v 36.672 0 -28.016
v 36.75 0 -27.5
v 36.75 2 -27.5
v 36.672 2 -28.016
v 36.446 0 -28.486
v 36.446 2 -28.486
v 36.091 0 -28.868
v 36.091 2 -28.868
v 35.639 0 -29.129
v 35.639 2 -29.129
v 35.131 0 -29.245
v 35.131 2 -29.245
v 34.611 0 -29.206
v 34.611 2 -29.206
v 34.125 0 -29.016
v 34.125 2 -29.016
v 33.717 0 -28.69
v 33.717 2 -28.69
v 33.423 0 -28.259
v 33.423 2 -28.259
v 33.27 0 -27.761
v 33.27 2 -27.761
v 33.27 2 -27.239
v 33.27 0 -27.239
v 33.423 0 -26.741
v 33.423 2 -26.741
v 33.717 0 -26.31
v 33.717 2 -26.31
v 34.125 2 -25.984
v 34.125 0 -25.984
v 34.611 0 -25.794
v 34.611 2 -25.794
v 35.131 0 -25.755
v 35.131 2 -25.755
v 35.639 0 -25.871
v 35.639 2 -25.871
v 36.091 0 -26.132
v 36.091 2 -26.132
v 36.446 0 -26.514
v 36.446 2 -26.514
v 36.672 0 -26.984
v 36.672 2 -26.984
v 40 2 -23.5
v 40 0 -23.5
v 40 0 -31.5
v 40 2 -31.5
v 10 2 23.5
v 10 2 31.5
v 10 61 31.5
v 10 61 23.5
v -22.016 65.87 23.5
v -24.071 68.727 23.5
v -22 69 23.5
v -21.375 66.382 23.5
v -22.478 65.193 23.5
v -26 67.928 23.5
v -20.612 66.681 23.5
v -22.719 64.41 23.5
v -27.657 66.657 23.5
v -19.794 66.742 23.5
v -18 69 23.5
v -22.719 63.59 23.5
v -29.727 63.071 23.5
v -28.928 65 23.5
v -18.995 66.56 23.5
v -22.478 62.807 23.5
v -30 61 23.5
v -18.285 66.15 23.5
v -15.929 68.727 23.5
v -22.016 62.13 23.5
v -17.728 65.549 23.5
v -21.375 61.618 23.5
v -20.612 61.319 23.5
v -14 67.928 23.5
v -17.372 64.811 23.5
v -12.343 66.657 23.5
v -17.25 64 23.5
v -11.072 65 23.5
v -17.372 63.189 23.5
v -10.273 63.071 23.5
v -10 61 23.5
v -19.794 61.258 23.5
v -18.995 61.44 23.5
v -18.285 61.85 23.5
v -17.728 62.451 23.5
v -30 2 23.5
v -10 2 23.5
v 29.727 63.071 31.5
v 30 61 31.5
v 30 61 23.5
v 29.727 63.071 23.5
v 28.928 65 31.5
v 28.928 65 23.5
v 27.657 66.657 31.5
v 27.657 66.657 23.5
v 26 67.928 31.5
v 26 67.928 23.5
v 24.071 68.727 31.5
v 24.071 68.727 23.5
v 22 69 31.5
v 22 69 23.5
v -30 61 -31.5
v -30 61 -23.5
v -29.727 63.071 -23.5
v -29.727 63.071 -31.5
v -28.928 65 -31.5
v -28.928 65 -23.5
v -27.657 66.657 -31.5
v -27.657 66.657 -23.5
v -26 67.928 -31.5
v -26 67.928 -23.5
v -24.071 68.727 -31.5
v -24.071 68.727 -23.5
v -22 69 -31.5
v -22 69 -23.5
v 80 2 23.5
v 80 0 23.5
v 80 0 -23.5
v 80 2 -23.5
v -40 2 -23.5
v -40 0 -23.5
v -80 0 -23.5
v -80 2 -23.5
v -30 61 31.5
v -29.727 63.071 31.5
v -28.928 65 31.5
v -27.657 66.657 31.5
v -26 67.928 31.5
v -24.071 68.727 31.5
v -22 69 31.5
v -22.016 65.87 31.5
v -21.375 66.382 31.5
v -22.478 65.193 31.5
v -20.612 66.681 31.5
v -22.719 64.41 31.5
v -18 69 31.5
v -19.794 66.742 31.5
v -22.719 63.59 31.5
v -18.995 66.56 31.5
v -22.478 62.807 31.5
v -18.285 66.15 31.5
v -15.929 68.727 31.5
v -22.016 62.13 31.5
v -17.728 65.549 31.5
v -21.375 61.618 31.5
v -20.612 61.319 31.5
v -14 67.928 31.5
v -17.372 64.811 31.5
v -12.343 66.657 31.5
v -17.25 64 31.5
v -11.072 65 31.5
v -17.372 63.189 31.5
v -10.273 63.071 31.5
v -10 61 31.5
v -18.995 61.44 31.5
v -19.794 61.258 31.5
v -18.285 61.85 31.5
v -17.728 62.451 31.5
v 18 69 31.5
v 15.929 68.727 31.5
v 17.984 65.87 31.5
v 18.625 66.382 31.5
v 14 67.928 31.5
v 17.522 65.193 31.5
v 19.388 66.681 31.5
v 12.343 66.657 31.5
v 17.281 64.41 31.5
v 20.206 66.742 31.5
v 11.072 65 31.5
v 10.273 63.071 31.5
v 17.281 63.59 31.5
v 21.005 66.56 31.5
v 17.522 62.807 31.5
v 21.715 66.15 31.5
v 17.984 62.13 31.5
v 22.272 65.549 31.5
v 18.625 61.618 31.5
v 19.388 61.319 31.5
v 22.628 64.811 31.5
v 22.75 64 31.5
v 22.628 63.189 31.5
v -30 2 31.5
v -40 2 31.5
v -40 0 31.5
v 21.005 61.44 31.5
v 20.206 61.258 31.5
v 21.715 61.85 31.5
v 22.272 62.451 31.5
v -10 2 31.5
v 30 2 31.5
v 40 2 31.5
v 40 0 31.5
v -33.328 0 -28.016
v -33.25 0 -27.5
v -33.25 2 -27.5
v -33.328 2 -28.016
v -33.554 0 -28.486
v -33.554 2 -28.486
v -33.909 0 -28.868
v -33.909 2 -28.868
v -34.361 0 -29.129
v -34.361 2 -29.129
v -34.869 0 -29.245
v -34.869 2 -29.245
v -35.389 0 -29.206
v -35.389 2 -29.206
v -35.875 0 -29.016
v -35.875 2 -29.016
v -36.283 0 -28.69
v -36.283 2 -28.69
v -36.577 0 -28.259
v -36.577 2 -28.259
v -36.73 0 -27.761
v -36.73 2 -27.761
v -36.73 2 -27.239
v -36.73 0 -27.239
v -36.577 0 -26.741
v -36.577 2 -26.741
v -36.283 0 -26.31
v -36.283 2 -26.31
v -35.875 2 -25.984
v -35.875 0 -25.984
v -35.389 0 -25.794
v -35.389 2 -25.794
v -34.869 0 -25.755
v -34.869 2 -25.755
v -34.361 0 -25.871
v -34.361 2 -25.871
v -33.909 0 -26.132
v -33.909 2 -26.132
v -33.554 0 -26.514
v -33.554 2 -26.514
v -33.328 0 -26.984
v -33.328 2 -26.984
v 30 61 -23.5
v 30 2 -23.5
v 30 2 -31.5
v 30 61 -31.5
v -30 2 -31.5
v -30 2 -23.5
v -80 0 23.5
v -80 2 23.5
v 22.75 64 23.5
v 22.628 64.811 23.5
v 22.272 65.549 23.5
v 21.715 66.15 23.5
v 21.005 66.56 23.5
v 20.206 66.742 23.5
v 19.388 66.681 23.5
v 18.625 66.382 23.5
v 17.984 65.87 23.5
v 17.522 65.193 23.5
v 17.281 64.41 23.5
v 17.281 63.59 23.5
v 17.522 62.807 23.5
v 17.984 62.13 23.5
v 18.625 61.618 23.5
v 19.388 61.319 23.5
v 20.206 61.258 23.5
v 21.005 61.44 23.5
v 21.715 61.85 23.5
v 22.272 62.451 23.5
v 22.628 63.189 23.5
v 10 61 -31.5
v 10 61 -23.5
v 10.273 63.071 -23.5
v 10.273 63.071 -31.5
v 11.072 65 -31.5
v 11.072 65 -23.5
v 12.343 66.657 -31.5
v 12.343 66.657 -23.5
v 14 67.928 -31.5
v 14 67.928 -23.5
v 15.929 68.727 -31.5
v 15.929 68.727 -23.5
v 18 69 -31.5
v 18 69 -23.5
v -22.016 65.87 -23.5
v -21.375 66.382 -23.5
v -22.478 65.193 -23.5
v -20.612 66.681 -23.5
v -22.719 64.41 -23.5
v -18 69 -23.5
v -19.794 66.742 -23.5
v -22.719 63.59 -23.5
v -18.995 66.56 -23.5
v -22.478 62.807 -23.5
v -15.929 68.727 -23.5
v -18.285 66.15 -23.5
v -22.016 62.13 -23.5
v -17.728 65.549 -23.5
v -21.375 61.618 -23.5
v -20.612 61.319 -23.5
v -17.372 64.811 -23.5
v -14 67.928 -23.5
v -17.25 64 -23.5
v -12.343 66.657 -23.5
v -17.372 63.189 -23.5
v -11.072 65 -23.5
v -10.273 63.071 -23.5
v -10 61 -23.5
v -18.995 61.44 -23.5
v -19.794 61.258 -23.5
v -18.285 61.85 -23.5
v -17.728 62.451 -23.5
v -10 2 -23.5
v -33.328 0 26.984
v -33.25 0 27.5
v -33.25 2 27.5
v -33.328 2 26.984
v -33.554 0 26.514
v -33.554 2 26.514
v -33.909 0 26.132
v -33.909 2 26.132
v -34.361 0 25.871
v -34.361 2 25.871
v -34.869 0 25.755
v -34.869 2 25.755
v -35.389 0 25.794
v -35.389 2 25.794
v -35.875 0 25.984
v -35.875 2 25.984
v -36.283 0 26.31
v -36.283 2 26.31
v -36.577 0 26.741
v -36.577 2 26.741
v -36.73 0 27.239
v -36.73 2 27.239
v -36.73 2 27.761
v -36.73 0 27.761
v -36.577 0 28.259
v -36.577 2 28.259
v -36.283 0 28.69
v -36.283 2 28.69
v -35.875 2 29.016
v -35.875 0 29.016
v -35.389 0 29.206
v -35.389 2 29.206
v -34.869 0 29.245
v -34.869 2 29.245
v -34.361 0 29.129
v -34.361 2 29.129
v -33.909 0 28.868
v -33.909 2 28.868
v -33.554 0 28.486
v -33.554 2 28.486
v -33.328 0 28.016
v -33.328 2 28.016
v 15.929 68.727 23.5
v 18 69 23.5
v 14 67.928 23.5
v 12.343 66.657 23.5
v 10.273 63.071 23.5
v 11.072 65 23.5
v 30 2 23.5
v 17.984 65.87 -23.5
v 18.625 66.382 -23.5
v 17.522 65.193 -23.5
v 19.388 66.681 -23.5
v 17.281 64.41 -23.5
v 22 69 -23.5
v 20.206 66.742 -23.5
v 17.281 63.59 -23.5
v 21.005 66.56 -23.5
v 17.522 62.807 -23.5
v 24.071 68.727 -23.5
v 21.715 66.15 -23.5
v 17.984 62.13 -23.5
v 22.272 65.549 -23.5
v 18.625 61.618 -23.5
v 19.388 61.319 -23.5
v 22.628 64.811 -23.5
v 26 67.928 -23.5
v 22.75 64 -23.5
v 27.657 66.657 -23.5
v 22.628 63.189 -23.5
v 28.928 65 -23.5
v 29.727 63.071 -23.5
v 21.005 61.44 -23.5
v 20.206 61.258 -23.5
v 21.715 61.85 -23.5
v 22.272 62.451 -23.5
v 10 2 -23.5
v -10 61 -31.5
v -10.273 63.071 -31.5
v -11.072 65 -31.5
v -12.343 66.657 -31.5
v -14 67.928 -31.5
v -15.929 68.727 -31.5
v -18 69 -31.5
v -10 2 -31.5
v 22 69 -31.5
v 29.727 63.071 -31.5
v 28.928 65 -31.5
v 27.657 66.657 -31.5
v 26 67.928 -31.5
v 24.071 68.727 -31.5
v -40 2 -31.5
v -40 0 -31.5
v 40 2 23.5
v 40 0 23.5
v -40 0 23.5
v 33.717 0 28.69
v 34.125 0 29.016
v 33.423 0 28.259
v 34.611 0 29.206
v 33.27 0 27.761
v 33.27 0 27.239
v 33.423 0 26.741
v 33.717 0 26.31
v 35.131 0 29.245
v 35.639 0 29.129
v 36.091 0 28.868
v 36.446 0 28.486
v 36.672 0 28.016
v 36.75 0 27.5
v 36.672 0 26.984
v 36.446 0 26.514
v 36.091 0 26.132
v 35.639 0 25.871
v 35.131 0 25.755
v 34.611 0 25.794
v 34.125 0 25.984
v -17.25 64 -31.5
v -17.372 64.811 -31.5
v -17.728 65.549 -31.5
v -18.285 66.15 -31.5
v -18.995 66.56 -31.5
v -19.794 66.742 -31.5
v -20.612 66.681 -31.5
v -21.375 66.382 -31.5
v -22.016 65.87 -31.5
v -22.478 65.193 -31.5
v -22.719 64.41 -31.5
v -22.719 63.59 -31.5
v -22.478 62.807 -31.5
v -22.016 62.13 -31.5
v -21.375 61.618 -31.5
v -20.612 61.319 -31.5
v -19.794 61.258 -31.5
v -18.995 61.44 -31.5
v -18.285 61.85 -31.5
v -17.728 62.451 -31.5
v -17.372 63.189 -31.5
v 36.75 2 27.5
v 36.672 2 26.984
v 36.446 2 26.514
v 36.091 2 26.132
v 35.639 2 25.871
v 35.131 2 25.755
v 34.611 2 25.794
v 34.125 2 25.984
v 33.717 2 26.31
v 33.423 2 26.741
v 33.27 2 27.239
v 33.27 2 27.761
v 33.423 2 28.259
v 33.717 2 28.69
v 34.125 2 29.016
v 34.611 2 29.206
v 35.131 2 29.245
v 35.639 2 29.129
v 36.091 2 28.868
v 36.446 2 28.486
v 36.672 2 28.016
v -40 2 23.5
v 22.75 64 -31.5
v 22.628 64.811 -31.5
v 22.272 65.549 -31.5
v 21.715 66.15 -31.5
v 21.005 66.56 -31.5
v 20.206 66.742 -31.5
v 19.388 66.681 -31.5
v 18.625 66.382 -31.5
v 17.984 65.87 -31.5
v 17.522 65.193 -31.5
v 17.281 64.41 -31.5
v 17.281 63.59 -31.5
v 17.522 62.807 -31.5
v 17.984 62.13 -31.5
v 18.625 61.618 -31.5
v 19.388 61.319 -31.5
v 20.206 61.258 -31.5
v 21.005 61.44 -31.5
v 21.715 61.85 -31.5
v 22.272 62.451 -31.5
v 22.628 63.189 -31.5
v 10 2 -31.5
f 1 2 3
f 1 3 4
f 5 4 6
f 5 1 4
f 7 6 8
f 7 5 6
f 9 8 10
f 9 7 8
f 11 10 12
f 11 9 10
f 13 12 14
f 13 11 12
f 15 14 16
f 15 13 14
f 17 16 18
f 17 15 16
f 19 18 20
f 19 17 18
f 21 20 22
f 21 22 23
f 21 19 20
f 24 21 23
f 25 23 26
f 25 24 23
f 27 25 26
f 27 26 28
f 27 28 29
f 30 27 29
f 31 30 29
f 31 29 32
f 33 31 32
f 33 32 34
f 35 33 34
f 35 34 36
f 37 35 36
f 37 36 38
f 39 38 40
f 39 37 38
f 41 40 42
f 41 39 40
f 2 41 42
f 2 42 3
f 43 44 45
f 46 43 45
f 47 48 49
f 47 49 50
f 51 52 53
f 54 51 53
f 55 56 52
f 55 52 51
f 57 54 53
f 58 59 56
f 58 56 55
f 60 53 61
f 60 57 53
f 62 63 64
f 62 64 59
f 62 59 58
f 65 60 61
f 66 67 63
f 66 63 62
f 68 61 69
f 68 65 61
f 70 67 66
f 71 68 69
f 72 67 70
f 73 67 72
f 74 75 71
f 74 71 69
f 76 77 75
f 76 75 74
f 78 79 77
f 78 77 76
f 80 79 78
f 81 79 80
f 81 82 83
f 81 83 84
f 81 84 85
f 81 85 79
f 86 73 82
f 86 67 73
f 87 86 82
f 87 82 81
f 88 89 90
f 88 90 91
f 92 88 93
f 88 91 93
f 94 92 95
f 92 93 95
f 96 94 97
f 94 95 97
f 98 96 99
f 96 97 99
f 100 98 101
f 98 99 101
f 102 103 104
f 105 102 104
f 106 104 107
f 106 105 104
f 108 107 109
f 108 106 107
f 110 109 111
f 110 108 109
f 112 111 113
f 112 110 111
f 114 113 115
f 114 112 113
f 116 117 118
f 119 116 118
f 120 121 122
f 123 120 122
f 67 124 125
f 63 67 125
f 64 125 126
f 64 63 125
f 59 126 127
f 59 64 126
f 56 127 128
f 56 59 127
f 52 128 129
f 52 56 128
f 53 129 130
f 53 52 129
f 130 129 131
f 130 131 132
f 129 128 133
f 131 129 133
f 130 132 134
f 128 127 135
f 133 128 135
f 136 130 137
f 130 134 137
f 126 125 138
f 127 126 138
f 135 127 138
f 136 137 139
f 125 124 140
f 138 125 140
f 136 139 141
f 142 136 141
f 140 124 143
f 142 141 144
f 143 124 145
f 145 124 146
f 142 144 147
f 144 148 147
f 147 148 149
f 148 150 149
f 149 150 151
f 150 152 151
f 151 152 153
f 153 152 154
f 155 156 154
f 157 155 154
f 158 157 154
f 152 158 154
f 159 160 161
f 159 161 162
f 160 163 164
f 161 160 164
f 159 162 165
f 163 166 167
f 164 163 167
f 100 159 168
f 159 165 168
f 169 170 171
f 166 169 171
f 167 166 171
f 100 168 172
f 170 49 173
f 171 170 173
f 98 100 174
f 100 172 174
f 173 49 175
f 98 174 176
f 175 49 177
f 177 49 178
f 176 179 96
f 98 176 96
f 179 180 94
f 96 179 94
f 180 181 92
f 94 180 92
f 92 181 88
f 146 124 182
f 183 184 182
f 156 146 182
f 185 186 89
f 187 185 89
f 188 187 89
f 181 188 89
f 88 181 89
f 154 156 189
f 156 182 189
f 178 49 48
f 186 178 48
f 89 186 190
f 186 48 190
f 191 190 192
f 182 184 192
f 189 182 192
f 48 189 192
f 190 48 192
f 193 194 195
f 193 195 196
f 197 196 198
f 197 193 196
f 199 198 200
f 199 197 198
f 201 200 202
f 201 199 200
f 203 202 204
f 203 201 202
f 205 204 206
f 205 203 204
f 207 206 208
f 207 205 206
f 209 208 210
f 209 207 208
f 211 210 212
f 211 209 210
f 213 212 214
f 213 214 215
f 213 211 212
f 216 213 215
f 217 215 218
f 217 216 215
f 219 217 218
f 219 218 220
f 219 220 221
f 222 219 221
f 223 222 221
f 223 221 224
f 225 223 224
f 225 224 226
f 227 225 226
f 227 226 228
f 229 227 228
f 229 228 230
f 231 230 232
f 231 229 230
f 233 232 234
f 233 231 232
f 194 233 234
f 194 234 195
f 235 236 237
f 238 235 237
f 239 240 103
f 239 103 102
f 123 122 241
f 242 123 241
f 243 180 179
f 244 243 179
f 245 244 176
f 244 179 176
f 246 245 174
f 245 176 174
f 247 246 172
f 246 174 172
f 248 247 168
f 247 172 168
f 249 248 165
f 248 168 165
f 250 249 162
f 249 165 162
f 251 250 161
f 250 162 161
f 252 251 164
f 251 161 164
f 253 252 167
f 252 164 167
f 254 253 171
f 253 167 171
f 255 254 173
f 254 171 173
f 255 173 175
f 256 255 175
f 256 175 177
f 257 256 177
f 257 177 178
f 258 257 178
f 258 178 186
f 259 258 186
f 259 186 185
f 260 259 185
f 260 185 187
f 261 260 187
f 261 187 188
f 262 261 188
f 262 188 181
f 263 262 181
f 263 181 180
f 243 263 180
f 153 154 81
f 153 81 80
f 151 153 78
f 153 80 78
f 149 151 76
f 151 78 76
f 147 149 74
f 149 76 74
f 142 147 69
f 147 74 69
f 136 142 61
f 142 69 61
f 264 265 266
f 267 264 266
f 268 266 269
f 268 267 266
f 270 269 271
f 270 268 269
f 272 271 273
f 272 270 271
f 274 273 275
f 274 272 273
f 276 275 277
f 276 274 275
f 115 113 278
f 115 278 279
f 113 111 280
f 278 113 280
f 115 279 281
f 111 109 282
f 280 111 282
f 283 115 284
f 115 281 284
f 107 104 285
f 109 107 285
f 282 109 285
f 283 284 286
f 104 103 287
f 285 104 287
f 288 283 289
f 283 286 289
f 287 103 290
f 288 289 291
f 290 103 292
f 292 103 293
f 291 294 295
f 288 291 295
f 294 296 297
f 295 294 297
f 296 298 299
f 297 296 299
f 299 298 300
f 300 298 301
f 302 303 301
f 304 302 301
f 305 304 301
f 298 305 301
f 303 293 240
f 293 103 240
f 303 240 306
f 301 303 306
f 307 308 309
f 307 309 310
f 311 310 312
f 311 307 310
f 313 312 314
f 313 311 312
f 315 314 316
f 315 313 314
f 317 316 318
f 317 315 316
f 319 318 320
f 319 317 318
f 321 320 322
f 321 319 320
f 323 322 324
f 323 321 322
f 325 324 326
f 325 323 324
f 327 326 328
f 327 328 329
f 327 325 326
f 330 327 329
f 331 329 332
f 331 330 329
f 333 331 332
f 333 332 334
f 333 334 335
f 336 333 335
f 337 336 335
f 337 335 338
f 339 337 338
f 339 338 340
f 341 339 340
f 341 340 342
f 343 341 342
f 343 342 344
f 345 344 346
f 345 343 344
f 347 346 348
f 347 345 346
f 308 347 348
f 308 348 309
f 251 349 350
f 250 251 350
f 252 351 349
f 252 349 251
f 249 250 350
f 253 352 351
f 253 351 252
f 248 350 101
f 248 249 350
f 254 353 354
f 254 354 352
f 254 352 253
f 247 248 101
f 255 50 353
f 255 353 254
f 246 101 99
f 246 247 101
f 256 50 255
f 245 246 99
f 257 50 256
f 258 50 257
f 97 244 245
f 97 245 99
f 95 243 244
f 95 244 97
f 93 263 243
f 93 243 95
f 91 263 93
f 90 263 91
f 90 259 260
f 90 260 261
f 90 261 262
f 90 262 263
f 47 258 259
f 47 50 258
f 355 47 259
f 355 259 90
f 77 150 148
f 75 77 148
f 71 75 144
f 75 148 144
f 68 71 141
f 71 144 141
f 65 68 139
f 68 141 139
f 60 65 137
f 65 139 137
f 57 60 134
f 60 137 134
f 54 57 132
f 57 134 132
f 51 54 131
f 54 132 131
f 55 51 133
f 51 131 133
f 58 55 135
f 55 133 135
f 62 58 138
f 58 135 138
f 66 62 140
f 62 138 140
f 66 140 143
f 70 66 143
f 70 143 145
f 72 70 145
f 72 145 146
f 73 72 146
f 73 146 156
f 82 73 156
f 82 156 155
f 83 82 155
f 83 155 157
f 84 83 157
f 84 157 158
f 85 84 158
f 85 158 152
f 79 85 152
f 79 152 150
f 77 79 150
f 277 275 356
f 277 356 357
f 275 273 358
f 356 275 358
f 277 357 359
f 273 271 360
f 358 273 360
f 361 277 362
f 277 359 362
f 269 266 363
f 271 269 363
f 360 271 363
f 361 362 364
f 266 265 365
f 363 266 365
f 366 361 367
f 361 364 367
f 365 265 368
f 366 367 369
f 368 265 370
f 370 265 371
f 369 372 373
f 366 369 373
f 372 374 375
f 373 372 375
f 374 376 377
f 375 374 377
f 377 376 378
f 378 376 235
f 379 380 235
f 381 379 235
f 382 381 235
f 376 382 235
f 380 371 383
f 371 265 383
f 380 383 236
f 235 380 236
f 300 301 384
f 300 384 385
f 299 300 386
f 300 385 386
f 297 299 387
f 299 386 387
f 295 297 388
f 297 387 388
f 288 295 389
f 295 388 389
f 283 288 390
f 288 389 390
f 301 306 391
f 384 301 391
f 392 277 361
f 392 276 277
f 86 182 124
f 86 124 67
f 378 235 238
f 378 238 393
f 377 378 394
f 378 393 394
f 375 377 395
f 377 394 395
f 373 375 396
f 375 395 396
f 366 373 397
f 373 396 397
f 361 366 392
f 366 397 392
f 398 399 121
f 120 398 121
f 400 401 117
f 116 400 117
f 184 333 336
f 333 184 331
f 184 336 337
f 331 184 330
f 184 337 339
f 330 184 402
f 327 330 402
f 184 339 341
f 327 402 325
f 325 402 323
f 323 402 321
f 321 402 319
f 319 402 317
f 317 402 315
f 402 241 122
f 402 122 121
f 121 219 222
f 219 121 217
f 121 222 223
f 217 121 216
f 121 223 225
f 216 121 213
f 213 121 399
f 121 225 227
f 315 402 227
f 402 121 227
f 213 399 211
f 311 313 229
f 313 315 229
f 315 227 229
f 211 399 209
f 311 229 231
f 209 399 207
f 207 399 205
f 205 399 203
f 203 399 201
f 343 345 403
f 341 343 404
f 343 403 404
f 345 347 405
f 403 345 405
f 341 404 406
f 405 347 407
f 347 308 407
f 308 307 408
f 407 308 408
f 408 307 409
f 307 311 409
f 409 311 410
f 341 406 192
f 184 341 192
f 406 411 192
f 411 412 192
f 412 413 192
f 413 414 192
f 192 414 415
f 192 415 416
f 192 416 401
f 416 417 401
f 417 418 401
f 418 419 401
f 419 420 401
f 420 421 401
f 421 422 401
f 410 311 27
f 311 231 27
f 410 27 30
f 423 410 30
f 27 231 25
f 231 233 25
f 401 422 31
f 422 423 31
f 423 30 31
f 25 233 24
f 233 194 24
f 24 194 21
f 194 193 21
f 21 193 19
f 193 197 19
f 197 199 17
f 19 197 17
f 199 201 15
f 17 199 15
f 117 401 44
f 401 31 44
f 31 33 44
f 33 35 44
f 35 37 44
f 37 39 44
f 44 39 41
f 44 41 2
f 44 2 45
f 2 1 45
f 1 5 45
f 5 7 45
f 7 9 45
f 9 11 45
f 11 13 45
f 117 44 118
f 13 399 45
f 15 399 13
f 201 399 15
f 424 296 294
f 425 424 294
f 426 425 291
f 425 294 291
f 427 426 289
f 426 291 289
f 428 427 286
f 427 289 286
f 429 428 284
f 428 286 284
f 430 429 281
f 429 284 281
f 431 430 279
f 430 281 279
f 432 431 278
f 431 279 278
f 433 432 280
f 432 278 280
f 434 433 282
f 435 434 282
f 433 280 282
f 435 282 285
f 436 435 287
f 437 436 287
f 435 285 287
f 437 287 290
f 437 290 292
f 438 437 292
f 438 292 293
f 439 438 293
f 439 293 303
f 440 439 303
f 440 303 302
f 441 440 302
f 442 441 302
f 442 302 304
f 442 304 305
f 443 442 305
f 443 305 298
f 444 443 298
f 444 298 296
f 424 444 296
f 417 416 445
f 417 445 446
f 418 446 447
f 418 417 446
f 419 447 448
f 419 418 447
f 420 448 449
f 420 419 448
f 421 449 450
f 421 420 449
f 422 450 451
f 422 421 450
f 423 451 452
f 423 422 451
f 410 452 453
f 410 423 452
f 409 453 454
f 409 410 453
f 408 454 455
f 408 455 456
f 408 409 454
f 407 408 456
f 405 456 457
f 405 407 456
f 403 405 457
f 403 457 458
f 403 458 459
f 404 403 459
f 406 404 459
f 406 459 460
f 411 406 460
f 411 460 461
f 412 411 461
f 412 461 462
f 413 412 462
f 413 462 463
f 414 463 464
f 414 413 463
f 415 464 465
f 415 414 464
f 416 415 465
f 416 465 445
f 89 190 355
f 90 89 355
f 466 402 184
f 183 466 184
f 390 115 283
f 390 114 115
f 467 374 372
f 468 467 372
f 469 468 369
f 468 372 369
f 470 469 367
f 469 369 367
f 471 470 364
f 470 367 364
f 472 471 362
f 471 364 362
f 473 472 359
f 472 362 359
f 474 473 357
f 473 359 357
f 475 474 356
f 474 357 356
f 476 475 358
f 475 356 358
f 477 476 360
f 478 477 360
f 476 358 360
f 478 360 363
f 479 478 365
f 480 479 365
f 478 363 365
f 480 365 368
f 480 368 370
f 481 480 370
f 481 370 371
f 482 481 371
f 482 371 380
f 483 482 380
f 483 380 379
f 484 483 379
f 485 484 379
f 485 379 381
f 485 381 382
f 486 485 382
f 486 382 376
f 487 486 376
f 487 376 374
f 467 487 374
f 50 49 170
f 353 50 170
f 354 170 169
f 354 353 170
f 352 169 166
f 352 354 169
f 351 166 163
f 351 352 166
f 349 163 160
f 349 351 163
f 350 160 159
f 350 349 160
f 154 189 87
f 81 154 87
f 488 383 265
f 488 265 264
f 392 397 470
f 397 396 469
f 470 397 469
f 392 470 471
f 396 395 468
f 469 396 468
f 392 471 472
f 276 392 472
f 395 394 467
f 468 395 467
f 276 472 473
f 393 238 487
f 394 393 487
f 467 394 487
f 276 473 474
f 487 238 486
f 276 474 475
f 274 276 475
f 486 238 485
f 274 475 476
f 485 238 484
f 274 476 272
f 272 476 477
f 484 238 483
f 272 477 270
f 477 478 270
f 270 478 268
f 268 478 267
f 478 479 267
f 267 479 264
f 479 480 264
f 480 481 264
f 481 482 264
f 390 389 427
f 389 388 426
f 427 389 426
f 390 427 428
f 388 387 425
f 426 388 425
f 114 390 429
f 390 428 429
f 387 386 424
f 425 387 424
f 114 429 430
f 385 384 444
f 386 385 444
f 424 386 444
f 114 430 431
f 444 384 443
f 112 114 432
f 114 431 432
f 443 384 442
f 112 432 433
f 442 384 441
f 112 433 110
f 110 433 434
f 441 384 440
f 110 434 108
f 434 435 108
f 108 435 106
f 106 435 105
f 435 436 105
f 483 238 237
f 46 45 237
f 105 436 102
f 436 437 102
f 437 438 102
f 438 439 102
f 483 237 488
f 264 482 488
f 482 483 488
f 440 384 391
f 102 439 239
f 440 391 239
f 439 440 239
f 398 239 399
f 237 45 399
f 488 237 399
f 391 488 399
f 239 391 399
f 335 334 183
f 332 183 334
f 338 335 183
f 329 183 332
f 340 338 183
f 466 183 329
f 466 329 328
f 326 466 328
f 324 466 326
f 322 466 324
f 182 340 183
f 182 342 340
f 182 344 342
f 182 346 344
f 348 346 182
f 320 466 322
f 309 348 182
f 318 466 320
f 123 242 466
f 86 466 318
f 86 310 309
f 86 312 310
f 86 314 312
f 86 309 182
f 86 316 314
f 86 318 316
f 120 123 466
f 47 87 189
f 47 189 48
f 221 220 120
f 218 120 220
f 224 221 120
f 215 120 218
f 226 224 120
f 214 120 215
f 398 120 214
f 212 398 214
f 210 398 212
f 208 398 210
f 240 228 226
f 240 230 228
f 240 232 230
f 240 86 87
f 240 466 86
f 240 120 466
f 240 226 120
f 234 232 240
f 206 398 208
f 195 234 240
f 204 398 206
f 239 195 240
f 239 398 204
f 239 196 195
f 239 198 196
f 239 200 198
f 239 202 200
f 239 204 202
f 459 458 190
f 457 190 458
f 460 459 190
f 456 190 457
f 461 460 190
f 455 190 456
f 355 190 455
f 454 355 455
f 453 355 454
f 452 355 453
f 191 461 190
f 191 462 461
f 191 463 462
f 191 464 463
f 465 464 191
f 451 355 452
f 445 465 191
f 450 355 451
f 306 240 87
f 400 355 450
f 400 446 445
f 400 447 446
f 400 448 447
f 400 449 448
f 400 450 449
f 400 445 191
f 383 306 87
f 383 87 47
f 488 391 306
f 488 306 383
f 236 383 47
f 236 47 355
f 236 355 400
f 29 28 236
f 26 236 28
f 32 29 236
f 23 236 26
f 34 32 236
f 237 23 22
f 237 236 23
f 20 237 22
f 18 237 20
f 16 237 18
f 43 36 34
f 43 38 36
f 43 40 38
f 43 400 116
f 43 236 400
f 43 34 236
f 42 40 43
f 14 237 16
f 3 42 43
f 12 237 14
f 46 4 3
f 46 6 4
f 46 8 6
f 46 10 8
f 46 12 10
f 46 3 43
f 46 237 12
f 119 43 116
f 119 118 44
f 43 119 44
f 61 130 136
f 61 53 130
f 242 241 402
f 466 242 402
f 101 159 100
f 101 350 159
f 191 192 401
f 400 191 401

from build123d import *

# Parameters (mm, degrees)
SKETCH_1_R               = 1.75
EXTRUDE_1_DEPTH          = 2
SKETCH_2_W               = 20
SKETCH_2_H               = 8
EXTRUDE_2_DEPTH          = 67
SKETCH_3_R               = 2.75
CUT_EXTRUDE_1_DEPTH      = 1
CUT_EXTRUDE_1_DEPTH_BACK = 64
FILLET_1_R               = 8


with BuildPart() as part:
    # Эскиз1 → Бобышка-Вытянуть1 (new body)
    with BuildSketch(Plane(origin=(0, 0, 0), x_dir=(1, 0, 0), z_dir=(0, 1, 0))):
        Polygon((-80, -23.5), (-40, -23.5), (-40, -31.5), (40, -31.5), (40, -23.5), (80, -23.5), (80, 23.5), (40, 23.5), (40, 31.5), (-40, 31.5), (-40, 23.5), (-80, 23.5), align=None)
        with Locations((-35, 27.5)):
            Circle(SKETCH_1_R, mode=Mode.SUBTRACT)
        with Locations((35, 27.5)):
            Circle(SKETCH_1_R, mode=Mode.SUBTRACT)
        with Locations((35, -27.5)):
            Circle(SKETCH_1_R, mode=Mode.SUBTRACT)
        with Locations((-35, -27.5)):
            Circle(SKETCH_1_R, mode=Mode.SUBTRACT)
    extrude(amount=EXTRUDE_1_DEPTH)

    # Эскиз2 → Бобышка-Вытянуть2 (add)
    with BuildSketch(Plane(origin=(0, 2, 0), x_dir=(1, 0, 0), z_dir=(0, 1, 0))):
        with Locations((20, -27.5)):
            Rectangle(SKETCH_2_W, SKETCH_2_H)
        with Locations((-20, -27.5)):
            Rectangle(SKETCH_2_W, SKETCH_2_H)
        with Locations((20, 27.5)):
            Rectangle(SKETCH_2_W, SKETCH_2_H)
        with Locations((-20, 27.5)):
            Rectangle(SKETCH_2_W, SKETCH_2_H)
    extrude(amount=EXTRUDE_2_DEPTH)

    # Эскиз3 → Вырез-Вытянуть1 (cut, two sides)
    with BuildSketch(Plane.XY.offset(31.5)) as cut_extrude_1_sk:
        with Locations((-20, 64)):
            Circle(SKETCH_3_R)
        with Locations((20, 64)):
            Circle(SKETCH_3_R)
    extrude(amount=CUT_EXTRUDE_1_DEPTH, mode=Mode.SUBTRACT)
    extrude(cut_extrude_1_sk.sketch, amount=-CUT_EXTRUDE_1_DEPTH_BACK, mode=Mode.SUBTRACT)

    # Скругление1
    fillet_1_edges = [part.edges().sort_by_distance(p)[0] for p in [
        (-30, 69, 27.5),
        (-10, 69, 27.5),
        (30, 69, 27.5),
        (10, 69, 27.5),
        (10, 69, -27.5),
        (30, 69, -27.5),
        (-30, 69, -27.5),
        (-10, 69, -27.5),
    ]]
    fillet(fillet_1_edges, radius=FILLET_1_R)


solid = part.part
